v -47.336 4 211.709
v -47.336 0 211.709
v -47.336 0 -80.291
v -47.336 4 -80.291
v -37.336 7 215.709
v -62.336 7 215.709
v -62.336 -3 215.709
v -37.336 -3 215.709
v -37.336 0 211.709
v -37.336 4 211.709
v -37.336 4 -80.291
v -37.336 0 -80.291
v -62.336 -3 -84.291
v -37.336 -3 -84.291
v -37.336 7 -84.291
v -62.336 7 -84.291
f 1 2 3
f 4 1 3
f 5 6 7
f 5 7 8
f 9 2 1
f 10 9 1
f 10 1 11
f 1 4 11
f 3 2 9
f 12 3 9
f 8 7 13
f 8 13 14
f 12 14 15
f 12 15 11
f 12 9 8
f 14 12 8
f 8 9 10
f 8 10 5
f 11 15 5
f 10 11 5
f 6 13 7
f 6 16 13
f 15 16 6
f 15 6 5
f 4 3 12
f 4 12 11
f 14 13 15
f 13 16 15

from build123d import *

# Parameters (mm, degrees)
SKETCH_1_W      = 15
SKETCH_1_H      = 300
EXTRUDE_1_DEPTH = 4
SKETCH_2_W      = 4
SKETCH_2_H      = 4
EXTRUDE_2_DEPTH = 10
SKETCH_3_W      = 25
SKETCH_3_H      = 300
EXTRUDE_3_DEPTH = 3
SKETCH_4_W      = 25
SKETCH_4_H      = 300
EXTRUDE_4_DEPTH = 3


with BuildPart() as part:
    # 草图1 → 凸台-拉伸1 (new body)
    with BuildSketch(Plane(origin=(0, 0, 0), x_dir=(1, 0, 0), z_dir=(0, 1, 0))):
        with Locations((-54.836215811, -65.70889057)):
            Rectangle(SKETCH_1_W, SKETCH_1_H)
    extrude(amount=EXTRUDE_1_DEPTH)

    # 草图2 → 凸台-拉伸2 (add)
    with BuildSketch(Plane(origin=(-47.336215811, 0, 0), x_dir=(0, 0, -1), z_dir=(1, 0, 0))):
        with Locations((-213.70889057, 2)):
            Rectangle(SKETCH_2_W, SKETCH_2_H)
        with Locations((82.29110943, 2)):
            Rectangle(SKETCH_2_W, SKETCH_2_H)
    extrude(amount=EXTRUDE_2_DEPTH)

    # 草图3 → 凸台-拉伸3 (add)
    with BuildSketch(Plane(origin=(0, 4, 0), x_dir=(1, 0, 0), z_dir=(0, 1, 0))):
        with Locations((-49.836215811, -65.70889057)):
            Rectangle(SKETCH_3_W, SKETCH_3_H)
    extrude(amount=EXTRUDE_3_DEPTH)

    # 草图4 → 凸台-拉伸4 (add)
    with BuildSketch(Plane.XZ):
        with Locations((-49.836215811, 65.70889057)):
            Rectangle(SKETCH_4_W, SKETCH_4_H)
    extrude(amount=EXTRUDE_4_DEPTH)


solid = part.part
